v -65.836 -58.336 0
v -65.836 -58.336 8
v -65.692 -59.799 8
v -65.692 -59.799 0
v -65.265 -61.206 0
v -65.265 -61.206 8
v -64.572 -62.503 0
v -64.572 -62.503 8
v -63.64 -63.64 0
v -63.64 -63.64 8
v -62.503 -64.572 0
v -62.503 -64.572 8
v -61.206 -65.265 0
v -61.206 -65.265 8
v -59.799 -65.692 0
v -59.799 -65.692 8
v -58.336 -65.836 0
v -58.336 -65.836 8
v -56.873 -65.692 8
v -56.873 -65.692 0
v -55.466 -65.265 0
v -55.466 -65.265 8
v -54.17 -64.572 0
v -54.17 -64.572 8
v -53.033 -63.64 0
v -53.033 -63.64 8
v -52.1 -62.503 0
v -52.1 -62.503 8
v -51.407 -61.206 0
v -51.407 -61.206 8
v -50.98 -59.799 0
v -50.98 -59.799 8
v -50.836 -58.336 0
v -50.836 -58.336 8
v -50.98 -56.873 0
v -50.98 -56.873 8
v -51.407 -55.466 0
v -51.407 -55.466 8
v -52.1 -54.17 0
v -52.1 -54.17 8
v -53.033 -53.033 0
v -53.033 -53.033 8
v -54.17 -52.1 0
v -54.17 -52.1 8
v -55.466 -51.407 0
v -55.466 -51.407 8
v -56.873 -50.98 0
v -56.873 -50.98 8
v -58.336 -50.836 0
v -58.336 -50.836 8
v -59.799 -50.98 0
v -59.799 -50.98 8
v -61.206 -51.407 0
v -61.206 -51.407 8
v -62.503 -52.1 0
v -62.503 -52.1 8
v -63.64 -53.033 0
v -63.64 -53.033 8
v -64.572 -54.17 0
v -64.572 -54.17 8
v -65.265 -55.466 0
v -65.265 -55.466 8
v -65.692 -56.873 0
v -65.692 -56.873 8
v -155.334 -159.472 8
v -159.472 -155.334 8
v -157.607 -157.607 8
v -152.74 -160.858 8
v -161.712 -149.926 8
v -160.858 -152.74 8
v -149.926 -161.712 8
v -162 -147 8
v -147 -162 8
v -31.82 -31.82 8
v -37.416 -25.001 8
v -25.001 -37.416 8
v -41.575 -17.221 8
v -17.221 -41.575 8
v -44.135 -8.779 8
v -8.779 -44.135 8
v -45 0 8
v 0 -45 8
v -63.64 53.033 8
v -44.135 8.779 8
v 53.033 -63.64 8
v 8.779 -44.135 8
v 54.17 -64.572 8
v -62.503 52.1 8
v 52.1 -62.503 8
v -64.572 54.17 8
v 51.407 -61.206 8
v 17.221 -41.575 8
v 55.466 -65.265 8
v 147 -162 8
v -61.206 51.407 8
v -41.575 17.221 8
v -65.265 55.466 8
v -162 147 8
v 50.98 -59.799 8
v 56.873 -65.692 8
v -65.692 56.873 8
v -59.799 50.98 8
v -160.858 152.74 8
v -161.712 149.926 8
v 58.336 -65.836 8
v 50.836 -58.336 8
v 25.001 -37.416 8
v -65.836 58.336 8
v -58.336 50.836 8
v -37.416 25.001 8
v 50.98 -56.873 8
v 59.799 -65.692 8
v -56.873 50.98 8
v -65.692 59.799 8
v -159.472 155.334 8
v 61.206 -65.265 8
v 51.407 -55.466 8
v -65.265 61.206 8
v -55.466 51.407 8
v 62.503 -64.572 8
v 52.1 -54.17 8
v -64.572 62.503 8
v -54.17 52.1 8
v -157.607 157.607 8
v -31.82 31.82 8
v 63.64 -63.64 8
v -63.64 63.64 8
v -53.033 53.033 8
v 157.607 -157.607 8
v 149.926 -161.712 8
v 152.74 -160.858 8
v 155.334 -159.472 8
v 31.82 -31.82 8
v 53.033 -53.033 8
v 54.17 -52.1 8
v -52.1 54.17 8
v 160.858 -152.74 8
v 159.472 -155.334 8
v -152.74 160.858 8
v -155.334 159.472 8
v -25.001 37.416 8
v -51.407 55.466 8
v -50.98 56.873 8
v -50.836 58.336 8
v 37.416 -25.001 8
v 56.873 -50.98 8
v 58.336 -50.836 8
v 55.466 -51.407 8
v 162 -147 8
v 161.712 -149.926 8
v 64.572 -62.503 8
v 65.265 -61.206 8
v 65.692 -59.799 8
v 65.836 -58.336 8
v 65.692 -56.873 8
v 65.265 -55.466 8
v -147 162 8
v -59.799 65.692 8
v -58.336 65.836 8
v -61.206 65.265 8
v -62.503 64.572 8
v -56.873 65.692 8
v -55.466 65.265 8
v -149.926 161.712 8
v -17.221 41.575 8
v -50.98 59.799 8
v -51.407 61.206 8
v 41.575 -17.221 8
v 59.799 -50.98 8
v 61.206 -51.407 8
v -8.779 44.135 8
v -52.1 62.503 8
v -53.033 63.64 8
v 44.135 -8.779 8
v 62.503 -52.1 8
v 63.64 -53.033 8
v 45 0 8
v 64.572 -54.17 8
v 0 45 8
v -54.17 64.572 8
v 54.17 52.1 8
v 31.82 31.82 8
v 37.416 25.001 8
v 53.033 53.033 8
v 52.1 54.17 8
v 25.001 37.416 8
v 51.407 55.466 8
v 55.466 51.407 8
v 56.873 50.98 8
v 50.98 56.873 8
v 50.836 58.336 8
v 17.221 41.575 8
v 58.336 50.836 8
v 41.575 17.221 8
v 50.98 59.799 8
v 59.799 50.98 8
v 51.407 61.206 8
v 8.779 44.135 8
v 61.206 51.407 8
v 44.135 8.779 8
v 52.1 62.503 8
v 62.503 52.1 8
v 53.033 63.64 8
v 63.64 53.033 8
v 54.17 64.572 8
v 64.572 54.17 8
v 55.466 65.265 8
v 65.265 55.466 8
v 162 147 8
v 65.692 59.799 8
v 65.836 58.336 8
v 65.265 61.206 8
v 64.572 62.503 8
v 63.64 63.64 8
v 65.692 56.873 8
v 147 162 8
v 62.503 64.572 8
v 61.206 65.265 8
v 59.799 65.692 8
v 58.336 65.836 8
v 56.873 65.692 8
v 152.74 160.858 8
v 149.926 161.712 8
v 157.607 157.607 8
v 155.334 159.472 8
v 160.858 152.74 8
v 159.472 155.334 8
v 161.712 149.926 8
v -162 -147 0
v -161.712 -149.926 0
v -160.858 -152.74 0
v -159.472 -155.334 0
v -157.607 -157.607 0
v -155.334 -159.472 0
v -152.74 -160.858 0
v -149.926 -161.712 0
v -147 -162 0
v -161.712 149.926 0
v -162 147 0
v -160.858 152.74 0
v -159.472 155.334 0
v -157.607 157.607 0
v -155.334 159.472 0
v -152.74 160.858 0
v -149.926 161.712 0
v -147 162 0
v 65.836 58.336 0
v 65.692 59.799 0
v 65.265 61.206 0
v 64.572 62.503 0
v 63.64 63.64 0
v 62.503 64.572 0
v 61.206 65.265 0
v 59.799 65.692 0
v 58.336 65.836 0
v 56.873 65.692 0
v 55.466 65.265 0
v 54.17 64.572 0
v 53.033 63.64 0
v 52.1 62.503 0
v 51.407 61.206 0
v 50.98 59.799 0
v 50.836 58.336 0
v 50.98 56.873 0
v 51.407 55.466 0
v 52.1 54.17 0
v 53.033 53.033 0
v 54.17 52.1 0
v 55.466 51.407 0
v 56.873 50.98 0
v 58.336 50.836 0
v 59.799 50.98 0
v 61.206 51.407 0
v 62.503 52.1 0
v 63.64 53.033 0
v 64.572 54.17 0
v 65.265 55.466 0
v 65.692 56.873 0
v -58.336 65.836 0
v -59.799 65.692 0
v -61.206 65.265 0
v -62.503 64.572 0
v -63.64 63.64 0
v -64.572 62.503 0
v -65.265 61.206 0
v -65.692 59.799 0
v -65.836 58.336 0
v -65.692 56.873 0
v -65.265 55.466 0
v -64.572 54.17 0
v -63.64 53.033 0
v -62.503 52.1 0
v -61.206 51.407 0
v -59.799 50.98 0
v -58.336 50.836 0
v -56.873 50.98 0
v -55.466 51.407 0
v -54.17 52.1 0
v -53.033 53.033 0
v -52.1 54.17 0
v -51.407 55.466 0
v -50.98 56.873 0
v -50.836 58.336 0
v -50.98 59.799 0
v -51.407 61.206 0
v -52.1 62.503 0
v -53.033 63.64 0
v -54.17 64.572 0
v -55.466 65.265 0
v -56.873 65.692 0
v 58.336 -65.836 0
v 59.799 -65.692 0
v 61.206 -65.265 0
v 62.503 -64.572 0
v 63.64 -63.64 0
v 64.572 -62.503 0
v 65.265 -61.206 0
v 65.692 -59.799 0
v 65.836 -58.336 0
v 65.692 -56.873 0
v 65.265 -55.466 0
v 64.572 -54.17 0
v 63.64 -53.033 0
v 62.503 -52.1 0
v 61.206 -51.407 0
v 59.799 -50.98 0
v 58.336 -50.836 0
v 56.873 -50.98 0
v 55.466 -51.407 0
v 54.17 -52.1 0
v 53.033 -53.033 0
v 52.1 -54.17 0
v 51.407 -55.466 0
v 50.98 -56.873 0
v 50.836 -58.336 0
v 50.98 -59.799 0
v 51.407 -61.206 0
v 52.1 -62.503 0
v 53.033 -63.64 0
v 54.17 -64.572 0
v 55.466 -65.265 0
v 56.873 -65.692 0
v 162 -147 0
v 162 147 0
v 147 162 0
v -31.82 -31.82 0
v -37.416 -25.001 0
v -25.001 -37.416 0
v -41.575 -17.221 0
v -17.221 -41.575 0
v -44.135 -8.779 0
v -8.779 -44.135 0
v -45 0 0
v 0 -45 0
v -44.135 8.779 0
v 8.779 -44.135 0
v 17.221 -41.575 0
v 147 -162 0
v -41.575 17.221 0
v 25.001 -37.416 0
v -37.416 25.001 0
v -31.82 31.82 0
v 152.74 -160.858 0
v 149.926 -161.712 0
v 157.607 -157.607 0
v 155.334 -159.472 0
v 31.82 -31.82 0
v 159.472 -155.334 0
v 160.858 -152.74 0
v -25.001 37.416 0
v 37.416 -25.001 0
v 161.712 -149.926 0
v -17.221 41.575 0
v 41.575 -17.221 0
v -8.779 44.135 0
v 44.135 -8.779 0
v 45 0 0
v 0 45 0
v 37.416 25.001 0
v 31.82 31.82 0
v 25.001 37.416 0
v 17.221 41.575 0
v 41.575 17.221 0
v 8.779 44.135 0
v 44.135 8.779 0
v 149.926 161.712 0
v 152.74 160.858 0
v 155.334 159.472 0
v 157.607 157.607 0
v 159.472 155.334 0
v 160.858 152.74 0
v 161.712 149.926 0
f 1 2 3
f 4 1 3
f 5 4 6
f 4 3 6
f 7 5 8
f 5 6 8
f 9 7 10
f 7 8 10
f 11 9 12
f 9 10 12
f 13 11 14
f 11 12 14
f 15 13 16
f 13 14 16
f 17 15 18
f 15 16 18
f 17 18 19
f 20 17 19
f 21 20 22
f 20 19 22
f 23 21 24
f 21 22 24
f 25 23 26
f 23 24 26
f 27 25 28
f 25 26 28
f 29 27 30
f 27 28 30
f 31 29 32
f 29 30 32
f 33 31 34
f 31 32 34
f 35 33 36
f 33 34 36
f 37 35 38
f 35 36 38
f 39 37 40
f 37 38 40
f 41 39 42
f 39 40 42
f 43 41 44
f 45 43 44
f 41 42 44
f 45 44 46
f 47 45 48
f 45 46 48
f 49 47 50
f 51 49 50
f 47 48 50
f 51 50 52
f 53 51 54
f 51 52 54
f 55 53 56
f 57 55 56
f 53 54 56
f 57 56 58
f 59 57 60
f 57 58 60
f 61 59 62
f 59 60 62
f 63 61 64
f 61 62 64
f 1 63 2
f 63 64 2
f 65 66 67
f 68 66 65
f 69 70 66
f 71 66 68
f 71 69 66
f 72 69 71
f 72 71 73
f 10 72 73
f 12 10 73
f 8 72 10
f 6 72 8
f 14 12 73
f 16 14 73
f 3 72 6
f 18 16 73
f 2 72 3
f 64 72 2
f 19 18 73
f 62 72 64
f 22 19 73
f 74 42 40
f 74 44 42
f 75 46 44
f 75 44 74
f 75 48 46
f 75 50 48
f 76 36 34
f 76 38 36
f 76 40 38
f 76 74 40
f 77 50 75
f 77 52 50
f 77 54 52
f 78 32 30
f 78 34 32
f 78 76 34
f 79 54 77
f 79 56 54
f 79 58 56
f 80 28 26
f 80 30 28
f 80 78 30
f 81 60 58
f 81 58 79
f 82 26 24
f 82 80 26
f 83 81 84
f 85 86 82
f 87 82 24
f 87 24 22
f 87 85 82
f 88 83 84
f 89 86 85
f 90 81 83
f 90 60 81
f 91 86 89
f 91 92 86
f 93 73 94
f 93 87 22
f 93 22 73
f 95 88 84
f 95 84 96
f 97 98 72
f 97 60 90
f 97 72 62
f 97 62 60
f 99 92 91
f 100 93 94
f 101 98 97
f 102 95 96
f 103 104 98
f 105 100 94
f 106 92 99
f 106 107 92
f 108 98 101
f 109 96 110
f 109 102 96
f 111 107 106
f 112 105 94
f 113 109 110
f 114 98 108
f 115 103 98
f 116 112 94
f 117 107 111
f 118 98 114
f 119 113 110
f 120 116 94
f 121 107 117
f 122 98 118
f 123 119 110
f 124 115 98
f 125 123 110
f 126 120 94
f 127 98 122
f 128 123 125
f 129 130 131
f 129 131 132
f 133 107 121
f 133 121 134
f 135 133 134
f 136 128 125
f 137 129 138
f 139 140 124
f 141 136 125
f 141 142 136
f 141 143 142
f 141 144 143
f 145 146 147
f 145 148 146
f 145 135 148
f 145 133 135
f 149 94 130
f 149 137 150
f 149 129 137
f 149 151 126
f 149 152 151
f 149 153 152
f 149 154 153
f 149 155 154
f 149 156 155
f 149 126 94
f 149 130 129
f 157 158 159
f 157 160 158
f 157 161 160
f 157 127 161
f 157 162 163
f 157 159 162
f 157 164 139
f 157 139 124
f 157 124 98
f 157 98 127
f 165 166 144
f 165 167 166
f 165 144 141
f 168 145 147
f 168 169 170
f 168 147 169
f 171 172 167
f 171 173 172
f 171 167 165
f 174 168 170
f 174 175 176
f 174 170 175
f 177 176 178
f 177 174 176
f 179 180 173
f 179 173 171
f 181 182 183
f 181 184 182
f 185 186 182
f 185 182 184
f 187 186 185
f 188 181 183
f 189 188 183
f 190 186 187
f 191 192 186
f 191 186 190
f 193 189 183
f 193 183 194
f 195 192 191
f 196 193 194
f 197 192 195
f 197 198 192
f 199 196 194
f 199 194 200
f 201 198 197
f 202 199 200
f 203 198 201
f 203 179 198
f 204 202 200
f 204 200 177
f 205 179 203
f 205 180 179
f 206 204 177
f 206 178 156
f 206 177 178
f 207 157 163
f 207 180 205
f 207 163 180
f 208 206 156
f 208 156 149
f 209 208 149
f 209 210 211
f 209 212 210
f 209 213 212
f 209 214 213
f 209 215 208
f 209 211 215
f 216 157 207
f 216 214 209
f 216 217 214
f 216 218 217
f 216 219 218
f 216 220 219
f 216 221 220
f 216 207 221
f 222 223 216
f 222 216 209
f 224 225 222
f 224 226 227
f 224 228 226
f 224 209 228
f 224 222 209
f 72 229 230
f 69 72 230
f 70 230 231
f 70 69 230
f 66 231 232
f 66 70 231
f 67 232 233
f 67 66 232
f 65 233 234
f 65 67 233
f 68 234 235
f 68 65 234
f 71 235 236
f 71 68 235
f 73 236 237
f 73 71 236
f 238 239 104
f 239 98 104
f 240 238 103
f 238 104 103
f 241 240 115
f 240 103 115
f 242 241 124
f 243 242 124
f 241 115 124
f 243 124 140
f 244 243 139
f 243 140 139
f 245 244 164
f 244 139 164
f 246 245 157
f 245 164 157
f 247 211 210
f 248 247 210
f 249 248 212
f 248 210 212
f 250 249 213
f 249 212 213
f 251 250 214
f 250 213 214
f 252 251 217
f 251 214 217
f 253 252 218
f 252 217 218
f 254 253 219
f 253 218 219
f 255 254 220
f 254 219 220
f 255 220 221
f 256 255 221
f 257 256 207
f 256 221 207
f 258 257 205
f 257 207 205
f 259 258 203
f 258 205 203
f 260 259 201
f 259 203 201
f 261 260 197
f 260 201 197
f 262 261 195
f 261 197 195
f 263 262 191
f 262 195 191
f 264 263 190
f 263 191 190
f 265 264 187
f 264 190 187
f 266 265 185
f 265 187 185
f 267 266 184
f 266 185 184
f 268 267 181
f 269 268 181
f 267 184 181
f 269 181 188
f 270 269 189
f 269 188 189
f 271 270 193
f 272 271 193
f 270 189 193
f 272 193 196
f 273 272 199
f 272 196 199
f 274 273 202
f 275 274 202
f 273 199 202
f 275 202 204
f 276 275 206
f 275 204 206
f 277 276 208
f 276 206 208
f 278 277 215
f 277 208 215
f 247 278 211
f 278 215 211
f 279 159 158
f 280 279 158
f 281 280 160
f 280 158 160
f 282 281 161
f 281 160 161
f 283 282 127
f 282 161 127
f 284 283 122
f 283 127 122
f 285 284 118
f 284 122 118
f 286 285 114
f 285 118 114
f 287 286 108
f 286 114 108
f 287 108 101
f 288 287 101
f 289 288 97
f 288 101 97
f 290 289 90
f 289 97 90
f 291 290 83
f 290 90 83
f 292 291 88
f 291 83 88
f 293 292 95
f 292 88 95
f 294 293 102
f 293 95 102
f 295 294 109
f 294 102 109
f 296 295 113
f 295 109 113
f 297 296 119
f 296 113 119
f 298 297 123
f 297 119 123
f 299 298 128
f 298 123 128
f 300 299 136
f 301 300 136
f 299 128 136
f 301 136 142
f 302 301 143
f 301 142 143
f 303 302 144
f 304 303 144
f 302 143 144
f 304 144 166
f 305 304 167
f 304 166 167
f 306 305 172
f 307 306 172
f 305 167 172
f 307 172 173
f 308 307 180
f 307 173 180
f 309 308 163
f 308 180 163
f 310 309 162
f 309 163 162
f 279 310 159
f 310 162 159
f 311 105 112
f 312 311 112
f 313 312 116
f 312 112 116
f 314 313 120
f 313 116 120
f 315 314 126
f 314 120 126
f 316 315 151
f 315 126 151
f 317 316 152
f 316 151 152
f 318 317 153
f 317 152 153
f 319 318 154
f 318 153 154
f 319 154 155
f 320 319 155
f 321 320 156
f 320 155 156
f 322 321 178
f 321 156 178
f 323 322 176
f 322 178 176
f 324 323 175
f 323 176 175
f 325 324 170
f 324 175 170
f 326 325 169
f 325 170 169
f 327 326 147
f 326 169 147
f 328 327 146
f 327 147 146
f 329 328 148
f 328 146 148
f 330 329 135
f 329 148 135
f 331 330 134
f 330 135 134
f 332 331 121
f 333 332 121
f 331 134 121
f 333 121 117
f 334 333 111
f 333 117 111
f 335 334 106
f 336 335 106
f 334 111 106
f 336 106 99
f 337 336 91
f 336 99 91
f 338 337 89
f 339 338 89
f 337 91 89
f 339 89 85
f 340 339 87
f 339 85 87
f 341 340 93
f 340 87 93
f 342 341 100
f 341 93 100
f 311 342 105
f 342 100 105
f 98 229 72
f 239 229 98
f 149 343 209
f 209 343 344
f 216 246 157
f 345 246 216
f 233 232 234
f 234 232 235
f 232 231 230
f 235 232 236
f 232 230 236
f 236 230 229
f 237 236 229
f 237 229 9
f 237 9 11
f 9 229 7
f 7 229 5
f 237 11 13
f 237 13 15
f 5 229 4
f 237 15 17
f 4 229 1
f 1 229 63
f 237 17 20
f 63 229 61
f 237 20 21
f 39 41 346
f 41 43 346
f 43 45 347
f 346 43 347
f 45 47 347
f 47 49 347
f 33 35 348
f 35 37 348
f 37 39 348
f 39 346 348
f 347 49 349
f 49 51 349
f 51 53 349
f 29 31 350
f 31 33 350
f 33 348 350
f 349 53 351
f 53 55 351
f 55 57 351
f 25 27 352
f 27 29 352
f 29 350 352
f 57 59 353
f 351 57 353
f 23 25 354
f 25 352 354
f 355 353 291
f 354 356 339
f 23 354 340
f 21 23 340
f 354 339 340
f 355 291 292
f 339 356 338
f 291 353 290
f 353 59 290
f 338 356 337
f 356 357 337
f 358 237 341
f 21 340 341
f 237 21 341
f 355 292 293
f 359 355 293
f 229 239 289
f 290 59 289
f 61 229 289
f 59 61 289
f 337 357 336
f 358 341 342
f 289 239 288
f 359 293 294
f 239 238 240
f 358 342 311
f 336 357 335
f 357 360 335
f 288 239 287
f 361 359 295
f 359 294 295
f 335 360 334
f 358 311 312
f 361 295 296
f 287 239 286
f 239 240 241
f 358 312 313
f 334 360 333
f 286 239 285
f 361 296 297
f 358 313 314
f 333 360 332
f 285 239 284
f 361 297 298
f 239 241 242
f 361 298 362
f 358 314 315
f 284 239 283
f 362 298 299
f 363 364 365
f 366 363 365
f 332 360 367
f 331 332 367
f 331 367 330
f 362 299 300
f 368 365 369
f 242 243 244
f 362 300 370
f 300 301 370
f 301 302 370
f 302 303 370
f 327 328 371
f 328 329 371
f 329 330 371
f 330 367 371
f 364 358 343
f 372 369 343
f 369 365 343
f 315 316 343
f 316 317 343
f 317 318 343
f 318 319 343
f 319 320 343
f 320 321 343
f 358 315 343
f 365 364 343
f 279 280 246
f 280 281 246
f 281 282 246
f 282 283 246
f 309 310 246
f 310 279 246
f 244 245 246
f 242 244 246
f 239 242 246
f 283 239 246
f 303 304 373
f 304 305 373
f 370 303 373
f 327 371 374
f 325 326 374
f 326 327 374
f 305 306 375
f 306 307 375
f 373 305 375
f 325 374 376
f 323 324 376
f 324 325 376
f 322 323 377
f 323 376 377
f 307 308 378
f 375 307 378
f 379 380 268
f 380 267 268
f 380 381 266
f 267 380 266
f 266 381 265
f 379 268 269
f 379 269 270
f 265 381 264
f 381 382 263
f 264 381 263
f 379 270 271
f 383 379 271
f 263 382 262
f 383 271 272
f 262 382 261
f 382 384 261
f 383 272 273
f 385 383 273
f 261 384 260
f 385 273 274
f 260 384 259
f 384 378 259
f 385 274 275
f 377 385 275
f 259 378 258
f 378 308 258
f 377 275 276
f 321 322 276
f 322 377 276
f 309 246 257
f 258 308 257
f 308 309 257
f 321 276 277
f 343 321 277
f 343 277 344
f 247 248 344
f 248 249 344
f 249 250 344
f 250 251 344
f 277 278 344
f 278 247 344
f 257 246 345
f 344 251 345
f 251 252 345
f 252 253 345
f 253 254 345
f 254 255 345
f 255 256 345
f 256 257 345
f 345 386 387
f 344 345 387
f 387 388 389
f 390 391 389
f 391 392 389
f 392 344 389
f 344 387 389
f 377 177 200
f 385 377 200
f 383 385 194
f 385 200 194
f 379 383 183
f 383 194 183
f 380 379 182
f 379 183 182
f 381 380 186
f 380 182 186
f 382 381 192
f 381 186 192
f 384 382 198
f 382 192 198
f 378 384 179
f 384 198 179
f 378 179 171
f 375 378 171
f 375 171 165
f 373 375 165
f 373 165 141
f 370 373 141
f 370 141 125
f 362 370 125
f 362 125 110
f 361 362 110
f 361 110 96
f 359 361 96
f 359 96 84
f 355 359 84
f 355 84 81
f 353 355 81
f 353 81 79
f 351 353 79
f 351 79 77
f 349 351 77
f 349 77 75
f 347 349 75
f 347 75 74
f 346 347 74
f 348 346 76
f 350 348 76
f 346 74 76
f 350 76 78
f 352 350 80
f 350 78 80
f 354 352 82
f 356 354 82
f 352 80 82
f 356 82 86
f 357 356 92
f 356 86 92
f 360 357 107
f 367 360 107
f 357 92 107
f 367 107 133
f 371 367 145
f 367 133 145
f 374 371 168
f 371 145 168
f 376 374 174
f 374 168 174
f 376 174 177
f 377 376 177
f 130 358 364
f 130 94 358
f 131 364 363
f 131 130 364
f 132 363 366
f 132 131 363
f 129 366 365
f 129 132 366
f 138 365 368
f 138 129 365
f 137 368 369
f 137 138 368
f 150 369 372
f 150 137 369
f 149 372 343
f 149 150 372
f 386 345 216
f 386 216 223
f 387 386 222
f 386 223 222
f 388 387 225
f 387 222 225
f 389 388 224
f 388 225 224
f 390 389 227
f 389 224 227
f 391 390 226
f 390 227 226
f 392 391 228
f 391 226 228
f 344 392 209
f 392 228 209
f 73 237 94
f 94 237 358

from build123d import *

# Parameters (mm, degrees)
SKETCH1_W           = 324
SKETCH1_H           = 324
BOSS_EXTRUDE1_DEPTH = 8
SKETCH2_R           = 7.5
CUT_EXTRUDE1_DEPTH  = 8
SKETCH3_R           = 45
CUT_EXTRUDE2_DEPTH  = 10
CIRPATTERN1_COUNT   = 4
FILLET1_R           = 15


with BuildPart() as part:
    # Sketch1 → Boss-Extrude1 (new body)
    with BuildSketch(Plane.XY):
        Rectangle(SKETCH1_W, SKETCH1_H)
    extrude(amount=BOSS_EXTRUDE1_DEPTH)

    # Sketch2 → Cut-Extrude1 (cut)
    with BuildSketch(Plane.XY.offset(8)):
        with Locations((58.336309448, 58.336309448)):
            Circle(SKETCH2_R)
    cut_extrude1 = extrude(amount=-CUT_EXTRUDE1_DEPTH, mode=Mode.SUBTRACT)

    # Sketch3 → Cut-Extrude2 (cut)
    with BuildSketch(Plane.XY.offset(8)):
        Circle(SKETCH3_R)
    extrude(amount=-CUT_EXTRUDE2_DEPTH, mode=Mode.SUBTRACT)

    # CirPattern1: Cut-Extrude1 ×4 about axis
    cirpattern1_axis = Axis((0, 0, 0), (0, 0, 1))
    for i in range(1, CIRPATTERN1_COUNT):
        add(cut_extrude1.rotate(cirpattern1_axis, i * 360 / CIRPATTERN1_COUNT), mode=Mode.SUBTRACT)

    # Fillet1
    fillet1_edges = [part.edges().sort_by_distance(p)[0] for p in [
        (162, -162, 4),
        (-162, -162, 4),
        (-162, 162, 4),
        (162, 162, 4),
    ]]
    fillet(fillet1_edges, radius=FILLET1_R)


solid = part.part
